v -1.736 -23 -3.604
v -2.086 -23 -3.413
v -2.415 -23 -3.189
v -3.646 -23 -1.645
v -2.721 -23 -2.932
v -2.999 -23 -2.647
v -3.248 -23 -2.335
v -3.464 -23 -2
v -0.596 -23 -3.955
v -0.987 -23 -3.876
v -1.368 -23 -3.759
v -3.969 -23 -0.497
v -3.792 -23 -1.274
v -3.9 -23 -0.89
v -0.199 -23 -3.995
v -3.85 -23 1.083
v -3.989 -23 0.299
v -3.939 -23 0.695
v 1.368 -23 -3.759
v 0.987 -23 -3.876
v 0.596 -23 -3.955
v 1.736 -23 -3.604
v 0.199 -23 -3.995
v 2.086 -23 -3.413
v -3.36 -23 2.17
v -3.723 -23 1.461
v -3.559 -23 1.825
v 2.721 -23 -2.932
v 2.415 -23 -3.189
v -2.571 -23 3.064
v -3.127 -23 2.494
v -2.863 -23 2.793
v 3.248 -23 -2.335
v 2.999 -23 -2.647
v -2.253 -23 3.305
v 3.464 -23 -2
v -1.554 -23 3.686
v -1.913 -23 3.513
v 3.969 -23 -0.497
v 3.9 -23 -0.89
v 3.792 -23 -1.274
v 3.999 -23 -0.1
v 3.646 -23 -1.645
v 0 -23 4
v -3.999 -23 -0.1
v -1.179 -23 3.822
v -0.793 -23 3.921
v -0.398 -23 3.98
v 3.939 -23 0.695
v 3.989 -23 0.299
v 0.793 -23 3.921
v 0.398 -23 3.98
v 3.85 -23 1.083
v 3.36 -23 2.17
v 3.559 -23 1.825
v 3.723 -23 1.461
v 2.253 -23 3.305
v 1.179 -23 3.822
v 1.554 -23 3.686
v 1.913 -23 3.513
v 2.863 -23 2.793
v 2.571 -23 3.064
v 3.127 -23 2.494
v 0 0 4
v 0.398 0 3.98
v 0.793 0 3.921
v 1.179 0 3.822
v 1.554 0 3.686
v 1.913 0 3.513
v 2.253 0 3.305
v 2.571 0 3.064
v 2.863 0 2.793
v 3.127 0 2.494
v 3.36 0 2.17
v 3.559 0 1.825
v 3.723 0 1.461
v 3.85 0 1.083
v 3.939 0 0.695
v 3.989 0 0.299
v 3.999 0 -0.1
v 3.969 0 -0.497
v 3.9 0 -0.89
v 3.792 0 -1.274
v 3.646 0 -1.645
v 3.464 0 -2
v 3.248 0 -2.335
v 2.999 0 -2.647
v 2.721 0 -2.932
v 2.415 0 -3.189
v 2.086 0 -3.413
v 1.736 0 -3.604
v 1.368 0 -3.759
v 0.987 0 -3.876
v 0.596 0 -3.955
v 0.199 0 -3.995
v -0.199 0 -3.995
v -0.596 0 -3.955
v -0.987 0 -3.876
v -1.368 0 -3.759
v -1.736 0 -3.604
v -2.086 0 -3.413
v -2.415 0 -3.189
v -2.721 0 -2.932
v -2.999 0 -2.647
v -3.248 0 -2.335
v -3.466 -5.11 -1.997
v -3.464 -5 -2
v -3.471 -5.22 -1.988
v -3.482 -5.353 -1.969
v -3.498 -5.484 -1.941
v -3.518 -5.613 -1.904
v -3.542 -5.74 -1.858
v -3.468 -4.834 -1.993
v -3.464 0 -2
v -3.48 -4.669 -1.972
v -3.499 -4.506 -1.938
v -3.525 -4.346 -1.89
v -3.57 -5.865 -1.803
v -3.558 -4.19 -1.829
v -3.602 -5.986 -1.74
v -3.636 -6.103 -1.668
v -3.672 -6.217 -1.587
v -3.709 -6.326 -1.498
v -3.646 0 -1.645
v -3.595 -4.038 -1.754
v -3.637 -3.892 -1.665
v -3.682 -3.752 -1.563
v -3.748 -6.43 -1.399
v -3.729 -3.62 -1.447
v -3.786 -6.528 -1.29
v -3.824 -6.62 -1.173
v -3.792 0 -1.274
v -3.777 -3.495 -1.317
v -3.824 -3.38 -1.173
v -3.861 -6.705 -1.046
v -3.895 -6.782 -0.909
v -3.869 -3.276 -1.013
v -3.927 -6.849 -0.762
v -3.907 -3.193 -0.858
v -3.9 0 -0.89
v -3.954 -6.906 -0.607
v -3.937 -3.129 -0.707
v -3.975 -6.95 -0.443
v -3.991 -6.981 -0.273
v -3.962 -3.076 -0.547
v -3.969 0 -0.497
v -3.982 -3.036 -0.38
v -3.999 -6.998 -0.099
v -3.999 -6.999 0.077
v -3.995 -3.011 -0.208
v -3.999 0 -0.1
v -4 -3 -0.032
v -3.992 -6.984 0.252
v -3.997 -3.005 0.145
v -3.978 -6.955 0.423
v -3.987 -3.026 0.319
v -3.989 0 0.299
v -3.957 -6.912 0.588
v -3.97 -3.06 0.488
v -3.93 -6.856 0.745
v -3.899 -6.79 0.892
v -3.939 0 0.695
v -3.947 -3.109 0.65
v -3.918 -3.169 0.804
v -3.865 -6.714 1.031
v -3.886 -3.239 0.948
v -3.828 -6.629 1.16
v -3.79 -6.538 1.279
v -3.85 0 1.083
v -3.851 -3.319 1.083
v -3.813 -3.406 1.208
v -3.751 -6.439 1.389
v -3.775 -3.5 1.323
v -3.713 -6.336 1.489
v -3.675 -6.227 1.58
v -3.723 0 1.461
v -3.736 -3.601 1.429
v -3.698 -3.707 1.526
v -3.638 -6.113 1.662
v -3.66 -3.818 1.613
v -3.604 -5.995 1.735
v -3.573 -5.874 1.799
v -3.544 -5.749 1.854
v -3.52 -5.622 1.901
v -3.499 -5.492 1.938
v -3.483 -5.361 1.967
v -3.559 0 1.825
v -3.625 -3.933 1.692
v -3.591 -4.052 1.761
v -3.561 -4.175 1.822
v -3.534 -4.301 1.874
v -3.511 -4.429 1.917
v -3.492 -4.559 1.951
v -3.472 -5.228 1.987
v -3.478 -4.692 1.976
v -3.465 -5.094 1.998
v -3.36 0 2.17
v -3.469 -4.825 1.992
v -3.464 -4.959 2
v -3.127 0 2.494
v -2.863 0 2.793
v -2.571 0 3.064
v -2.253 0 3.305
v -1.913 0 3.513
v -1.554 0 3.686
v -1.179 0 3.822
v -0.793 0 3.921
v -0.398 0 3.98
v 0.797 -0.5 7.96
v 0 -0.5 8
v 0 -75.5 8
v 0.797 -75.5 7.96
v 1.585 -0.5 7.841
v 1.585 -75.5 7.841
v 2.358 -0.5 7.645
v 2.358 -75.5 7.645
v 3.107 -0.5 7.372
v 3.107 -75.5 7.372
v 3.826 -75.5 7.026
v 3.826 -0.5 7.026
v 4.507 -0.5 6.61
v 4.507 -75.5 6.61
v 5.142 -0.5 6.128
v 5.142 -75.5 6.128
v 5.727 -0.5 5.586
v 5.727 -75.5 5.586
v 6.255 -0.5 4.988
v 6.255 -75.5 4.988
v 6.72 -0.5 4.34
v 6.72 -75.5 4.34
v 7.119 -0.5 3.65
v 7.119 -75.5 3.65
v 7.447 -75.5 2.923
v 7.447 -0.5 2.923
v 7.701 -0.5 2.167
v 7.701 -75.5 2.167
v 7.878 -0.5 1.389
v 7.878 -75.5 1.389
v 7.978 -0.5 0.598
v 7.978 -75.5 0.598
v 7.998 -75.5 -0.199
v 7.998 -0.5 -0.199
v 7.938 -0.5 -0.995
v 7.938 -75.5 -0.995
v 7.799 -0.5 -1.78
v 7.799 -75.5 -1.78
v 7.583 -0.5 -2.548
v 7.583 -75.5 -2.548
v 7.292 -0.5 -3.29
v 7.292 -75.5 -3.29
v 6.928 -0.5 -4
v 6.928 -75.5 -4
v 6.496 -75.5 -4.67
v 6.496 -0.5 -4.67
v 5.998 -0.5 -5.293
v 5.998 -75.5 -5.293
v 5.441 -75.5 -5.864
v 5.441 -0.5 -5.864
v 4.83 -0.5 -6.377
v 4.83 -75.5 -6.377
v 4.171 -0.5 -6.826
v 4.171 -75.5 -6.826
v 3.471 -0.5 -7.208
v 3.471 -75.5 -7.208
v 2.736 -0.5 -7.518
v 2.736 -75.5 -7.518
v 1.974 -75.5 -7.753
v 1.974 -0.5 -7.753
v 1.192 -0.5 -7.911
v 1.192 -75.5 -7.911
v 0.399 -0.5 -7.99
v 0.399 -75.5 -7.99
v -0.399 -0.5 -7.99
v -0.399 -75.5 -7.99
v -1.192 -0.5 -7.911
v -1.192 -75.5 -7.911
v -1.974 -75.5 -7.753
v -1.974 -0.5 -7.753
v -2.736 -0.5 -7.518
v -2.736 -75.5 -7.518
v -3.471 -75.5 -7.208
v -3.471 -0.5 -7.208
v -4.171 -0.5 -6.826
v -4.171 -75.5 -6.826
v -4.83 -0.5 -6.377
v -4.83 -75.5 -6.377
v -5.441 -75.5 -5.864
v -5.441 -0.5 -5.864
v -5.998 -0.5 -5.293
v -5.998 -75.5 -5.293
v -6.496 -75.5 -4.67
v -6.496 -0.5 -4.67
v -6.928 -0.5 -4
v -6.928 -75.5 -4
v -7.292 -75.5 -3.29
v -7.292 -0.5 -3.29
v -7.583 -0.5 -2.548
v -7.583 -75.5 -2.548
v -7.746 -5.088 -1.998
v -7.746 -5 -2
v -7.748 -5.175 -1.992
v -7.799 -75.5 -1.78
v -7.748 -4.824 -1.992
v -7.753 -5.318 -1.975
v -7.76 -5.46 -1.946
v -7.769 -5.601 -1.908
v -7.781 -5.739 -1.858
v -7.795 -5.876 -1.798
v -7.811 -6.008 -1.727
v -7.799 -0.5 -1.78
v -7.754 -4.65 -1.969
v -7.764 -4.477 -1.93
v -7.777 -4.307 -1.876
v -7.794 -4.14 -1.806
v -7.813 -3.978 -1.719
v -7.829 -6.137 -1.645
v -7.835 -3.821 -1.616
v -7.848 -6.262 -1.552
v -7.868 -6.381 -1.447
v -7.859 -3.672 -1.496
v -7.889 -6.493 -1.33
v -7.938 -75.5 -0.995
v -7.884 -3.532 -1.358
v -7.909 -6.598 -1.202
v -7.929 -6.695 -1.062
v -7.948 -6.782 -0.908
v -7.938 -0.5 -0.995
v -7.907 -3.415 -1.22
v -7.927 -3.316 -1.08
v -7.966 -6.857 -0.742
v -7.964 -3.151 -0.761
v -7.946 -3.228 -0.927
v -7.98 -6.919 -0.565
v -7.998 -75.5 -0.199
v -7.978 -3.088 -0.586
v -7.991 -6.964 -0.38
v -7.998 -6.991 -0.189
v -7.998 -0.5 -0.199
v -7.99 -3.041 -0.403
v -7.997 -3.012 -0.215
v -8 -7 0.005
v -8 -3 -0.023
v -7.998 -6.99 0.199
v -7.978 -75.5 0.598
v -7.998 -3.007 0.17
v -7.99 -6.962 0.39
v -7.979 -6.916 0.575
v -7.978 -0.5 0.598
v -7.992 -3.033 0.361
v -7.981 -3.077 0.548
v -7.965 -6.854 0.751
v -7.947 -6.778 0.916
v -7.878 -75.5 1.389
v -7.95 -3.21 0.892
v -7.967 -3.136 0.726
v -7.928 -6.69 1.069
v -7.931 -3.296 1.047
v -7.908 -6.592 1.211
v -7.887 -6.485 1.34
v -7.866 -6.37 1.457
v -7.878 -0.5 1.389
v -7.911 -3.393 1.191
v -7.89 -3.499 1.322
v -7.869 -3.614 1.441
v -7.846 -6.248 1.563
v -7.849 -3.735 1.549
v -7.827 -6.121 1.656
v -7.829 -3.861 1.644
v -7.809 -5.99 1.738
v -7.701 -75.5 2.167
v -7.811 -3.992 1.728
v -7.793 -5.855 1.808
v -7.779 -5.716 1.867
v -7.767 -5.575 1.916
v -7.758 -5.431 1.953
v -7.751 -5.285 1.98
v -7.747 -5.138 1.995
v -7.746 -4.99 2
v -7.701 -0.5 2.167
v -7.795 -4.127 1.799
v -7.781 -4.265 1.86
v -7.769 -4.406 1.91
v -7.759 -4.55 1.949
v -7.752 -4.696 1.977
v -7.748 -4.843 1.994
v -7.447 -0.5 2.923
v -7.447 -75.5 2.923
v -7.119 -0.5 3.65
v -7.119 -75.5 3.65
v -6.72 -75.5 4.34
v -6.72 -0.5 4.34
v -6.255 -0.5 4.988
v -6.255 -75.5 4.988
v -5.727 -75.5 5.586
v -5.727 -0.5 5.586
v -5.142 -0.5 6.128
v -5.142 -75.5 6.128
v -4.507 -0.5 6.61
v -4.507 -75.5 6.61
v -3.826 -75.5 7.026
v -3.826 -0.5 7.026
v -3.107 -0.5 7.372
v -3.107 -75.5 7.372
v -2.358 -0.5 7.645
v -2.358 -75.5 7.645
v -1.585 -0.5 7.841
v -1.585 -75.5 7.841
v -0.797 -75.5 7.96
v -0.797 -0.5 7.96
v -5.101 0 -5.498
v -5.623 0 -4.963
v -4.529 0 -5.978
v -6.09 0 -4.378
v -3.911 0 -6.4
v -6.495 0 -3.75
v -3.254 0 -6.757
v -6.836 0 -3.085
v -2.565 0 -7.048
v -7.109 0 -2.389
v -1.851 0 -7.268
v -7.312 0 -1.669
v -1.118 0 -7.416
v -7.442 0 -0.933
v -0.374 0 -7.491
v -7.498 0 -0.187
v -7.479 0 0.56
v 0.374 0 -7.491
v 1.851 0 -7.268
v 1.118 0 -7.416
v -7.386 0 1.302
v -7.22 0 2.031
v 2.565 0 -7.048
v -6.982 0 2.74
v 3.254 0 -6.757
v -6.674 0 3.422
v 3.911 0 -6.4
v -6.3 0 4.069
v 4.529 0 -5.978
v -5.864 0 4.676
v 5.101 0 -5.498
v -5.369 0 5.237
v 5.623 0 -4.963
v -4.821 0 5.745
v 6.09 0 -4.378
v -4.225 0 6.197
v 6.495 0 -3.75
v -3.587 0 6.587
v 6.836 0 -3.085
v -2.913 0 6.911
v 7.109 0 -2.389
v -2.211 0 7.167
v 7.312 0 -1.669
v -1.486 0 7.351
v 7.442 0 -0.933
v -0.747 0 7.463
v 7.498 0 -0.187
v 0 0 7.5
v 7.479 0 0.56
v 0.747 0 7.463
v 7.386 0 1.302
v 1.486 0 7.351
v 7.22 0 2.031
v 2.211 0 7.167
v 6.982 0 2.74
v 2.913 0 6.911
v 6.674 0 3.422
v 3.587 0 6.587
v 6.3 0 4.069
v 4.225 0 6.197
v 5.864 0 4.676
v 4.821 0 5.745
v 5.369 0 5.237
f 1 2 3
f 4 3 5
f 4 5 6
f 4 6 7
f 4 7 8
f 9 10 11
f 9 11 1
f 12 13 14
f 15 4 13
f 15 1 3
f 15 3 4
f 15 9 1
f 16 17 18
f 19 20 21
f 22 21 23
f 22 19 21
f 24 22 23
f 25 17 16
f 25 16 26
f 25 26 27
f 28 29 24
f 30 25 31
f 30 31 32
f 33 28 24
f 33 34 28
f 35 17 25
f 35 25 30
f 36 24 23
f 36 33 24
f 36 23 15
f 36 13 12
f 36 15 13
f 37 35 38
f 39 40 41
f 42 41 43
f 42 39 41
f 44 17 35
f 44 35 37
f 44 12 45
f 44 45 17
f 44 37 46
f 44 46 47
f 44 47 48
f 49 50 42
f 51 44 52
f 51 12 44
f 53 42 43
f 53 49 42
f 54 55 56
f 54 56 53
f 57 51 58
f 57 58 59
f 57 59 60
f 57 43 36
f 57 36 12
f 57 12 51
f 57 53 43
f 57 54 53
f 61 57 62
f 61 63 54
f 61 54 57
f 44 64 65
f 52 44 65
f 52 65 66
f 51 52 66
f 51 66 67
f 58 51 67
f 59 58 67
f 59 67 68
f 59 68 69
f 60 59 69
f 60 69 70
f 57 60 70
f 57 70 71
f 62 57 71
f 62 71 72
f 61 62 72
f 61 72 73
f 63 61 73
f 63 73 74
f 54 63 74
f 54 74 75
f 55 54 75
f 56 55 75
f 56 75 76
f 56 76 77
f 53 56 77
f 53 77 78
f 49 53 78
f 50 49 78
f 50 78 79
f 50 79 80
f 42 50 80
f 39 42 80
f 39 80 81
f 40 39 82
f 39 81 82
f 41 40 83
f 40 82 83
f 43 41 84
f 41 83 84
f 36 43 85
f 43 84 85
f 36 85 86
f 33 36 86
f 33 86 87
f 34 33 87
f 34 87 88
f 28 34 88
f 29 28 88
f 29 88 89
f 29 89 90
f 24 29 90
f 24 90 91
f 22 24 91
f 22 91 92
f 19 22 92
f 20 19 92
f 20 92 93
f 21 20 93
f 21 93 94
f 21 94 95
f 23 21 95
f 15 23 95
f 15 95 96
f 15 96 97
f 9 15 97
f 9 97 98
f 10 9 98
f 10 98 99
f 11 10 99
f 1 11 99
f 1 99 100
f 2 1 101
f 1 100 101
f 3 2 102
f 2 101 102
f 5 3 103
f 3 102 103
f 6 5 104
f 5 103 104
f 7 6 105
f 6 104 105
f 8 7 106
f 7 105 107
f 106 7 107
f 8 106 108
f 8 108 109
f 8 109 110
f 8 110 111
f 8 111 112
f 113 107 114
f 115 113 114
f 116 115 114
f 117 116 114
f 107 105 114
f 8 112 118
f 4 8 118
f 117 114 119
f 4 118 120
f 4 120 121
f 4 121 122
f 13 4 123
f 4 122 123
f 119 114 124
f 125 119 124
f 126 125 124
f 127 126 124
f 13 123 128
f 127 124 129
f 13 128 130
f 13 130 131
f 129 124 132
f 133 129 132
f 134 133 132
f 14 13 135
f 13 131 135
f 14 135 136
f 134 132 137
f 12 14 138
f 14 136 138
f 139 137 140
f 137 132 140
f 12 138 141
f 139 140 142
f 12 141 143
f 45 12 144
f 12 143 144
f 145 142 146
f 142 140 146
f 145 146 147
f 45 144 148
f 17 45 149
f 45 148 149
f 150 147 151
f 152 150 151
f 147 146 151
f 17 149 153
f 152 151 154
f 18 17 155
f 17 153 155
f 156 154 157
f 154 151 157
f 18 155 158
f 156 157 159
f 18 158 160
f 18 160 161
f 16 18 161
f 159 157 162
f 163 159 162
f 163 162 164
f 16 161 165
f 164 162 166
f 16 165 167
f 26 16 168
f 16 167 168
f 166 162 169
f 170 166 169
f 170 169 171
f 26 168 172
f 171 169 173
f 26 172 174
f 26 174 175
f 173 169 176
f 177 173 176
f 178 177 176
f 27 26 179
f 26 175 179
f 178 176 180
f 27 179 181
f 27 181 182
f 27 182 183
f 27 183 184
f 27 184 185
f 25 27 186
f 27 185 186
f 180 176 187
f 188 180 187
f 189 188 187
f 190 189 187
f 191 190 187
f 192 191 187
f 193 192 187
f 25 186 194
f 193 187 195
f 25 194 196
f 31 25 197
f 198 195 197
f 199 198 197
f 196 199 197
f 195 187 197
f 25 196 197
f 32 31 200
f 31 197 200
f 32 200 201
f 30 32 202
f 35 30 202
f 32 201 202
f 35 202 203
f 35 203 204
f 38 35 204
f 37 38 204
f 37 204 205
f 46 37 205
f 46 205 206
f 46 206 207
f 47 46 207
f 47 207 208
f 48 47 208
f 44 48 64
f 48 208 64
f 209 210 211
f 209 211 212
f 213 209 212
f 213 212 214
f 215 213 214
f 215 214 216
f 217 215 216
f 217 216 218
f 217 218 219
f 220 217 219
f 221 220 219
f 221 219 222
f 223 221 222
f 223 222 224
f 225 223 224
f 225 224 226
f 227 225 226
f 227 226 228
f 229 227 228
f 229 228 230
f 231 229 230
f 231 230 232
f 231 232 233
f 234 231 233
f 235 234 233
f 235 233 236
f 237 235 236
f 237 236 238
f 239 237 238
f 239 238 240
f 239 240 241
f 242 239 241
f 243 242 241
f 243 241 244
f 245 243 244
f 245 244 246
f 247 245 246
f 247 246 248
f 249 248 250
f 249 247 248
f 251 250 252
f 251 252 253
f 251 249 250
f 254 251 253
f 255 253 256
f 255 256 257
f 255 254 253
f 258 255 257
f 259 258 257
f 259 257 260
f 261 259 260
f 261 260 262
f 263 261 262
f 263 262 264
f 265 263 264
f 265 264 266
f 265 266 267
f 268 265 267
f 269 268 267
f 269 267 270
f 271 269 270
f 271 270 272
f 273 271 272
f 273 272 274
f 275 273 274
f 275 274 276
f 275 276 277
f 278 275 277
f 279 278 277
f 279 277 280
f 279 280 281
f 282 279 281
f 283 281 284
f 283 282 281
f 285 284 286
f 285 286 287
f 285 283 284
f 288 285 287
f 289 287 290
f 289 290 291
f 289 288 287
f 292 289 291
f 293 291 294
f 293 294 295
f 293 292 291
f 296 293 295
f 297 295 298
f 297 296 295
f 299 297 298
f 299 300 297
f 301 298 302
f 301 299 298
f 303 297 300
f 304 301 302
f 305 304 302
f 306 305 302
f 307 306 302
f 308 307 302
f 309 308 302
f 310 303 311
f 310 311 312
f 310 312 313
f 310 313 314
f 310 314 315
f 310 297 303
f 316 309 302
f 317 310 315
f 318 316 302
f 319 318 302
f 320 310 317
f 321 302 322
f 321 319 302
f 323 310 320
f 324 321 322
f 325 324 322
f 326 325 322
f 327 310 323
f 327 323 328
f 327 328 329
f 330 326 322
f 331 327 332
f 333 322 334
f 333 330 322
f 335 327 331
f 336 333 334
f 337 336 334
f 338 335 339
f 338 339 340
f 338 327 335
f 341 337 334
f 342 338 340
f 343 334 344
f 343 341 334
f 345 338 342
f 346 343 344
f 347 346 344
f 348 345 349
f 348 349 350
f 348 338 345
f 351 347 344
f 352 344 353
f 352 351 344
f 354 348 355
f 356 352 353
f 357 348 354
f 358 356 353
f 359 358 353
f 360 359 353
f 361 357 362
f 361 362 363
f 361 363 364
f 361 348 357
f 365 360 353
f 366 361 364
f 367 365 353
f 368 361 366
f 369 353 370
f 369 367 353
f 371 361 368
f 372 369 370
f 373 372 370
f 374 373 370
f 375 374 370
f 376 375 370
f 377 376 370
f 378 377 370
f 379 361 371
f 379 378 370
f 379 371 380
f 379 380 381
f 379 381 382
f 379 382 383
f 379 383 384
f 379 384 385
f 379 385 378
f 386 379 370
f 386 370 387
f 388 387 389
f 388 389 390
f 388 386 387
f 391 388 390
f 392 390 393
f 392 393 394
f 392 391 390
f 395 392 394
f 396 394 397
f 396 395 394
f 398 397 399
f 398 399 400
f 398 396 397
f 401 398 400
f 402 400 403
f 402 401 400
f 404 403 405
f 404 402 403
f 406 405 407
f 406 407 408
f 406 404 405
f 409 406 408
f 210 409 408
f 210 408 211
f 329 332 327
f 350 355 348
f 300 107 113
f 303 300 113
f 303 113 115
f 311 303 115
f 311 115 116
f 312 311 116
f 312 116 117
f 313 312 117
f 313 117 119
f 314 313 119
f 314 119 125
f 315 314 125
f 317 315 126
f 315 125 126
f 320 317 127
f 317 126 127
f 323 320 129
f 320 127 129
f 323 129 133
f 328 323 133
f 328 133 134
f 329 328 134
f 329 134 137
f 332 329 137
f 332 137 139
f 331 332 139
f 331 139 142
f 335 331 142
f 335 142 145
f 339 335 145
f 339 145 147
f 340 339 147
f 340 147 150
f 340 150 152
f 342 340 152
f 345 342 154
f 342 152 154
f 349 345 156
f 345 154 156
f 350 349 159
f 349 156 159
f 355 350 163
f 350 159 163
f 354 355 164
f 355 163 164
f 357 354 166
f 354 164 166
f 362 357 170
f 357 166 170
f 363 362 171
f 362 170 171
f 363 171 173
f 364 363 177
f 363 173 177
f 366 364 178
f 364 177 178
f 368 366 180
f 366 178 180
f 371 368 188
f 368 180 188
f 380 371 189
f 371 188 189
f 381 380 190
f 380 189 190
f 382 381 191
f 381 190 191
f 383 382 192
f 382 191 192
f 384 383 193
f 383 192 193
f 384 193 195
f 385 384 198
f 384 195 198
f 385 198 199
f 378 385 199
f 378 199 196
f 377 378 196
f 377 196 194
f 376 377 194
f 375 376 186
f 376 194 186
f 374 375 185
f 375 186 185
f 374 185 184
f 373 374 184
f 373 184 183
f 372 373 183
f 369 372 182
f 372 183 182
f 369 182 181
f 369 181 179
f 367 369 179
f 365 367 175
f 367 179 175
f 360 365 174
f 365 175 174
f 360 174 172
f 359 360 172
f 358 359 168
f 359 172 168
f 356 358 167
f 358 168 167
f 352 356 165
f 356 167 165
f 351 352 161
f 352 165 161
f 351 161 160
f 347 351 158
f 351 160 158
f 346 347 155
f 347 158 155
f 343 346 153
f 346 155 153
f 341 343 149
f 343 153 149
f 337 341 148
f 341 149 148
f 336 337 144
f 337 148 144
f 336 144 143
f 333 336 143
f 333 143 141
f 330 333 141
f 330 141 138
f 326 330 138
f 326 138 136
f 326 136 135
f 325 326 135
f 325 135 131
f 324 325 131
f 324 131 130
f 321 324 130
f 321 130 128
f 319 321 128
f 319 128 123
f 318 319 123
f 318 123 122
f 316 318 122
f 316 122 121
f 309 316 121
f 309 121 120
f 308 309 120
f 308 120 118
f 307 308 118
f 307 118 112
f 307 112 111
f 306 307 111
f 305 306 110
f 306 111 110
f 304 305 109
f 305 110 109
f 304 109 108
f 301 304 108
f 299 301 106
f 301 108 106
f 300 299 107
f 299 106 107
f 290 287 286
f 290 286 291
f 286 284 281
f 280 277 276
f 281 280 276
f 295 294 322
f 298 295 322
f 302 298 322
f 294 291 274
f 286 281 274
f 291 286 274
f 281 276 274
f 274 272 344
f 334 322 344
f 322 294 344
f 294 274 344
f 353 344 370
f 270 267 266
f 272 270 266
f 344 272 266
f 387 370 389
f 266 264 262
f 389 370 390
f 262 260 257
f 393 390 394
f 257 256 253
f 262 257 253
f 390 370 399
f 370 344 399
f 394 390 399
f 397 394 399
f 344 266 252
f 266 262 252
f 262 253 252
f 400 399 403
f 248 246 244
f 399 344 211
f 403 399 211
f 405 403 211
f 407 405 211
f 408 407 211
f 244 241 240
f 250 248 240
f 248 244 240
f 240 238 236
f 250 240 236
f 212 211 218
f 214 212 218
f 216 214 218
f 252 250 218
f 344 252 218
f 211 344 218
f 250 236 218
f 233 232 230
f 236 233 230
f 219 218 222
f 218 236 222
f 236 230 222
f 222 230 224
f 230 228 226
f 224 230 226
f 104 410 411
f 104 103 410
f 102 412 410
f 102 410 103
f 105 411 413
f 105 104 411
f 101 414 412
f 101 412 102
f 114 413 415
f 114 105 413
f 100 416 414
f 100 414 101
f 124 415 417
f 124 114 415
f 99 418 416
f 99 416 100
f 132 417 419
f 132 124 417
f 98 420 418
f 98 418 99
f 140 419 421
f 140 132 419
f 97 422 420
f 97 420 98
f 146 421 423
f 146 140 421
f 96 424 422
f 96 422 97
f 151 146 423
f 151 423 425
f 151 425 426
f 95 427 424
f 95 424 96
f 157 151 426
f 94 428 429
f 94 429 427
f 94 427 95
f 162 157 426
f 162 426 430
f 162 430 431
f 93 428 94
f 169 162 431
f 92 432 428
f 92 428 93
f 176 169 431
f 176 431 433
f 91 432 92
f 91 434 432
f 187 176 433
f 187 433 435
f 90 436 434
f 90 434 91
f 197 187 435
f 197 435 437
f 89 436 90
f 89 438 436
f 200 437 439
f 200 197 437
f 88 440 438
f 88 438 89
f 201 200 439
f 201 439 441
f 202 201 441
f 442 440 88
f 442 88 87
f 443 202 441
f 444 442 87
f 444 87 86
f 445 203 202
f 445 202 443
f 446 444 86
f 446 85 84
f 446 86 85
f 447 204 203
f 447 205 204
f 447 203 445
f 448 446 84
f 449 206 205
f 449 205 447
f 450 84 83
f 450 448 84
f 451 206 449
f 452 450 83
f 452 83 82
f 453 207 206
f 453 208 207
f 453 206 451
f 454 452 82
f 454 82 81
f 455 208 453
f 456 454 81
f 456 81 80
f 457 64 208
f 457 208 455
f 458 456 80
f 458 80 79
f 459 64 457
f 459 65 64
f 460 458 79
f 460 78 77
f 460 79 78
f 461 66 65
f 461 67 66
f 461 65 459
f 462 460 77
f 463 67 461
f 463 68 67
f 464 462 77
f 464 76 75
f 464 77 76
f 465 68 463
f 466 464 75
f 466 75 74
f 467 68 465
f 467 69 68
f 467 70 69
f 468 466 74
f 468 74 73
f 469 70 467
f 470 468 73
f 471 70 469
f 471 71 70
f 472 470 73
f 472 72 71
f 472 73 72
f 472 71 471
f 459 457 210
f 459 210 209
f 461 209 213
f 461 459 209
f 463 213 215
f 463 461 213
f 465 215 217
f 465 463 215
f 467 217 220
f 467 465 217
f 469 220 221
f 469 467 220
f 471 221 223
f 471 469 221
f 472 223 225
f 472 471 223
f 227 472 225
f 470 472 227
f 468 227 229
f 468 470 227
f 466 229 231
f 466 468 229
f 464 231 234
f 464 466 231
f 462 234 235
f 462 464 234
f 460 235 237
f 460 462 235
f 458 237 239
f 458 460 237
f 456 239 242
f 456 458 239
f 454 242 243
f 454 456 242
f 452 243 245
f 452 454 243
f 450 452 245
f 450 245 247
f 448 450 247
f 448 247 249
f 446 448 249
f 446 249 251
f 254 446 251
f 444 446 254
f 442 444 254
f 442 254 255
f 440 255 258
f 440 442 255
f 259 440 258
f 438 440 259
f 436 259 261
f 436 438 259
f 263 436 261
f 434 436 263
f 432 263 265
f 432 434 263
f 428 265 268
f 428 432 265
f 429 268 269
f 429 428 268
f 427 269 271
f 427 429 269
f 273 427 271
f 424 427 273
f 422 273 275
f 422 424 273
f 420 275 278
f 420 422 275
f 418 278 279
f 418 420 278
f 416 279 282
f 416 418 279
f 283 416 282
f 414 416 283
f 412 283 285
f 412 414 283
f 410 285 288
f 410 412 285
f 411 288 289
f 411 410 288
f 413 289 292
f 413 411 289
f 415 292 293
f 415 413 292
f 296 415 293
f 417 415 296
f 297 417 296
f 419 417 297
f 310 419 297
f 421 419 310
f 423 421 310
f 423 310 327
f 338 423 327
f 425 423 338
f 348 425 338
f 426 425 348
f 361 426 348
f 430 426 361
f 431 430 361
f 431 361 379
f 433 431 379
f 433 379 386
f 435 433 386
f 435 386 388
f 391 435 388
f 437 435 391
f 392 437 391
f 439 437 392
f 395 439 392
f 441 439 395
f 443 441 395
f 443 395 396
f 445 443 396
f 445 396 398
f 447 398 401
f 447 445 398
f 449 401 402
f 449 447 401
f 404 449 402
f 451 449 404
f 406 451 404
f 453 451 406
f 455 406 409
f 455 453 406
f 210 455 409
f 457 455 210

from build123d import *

# Parameters (mm, degrees)
SKETCH_1_R          = 8
EXTRUDE_1_DEPTH     = 75.5
CHAMFER_1_SIZE      = 0.5
SKETCH_3_R          = 4
CUT_EXTRUDE_1_DEPTH = 23
SKETCH_4_R          = 2
CUT_EXTRUDE_2_DEPTH = 23


with BuildPart() as part:
    # 스케치1 → 보스-돌출1 (new body)
    with BuildSketch(Plane(origin=(0, 0, 0), x_dir=(1, 0, 0), z_dir=(0, 1, 0))):
        with Locations(Location((0, 0, 0), (0, 0, 270))):
            Circle(SKETCH_1_R)
    extrude(amount=-EXTRUDE_1_DEPTH)

    # 모따기1
    chamfer_1_edges = [part.edges().sort_by_distance(p)[0] for p in [
        (0, 0, -8),
    ]]
    chamfer(chamfer_1_edges, length=CHAMFER_1_SIZE)

    # 스케치3 → 컷-돌출1 (cut)
    with BuildSketch(Plane(origin=(0, 0, 0), x_dir=(1, 0, 0), z_dir=(0, 1, 0))):
        with Locations(Location((0, 0, 0), (0, 0, 270))):
            Circle(SKETCH_3_R)
    extrude(amount=-CUT_EXTRUDE_1_DEPTH, mode=Mode.SUBTRACT)

    # 스케치4 → 컷-돌출2 (cut)
    with BuildSketch(Plane(origin=(0, 0, 0), x_dir=(0, 0, -1), z_dir=(1, 0, 0))):
        with Locations((0, -5)):
            Circle(SKETCH_4_R)
    extrude(amount=-CUT_EXTRUDE_2_DEPTH, mode=Mode.SUBTRACT)


solid = part.part
